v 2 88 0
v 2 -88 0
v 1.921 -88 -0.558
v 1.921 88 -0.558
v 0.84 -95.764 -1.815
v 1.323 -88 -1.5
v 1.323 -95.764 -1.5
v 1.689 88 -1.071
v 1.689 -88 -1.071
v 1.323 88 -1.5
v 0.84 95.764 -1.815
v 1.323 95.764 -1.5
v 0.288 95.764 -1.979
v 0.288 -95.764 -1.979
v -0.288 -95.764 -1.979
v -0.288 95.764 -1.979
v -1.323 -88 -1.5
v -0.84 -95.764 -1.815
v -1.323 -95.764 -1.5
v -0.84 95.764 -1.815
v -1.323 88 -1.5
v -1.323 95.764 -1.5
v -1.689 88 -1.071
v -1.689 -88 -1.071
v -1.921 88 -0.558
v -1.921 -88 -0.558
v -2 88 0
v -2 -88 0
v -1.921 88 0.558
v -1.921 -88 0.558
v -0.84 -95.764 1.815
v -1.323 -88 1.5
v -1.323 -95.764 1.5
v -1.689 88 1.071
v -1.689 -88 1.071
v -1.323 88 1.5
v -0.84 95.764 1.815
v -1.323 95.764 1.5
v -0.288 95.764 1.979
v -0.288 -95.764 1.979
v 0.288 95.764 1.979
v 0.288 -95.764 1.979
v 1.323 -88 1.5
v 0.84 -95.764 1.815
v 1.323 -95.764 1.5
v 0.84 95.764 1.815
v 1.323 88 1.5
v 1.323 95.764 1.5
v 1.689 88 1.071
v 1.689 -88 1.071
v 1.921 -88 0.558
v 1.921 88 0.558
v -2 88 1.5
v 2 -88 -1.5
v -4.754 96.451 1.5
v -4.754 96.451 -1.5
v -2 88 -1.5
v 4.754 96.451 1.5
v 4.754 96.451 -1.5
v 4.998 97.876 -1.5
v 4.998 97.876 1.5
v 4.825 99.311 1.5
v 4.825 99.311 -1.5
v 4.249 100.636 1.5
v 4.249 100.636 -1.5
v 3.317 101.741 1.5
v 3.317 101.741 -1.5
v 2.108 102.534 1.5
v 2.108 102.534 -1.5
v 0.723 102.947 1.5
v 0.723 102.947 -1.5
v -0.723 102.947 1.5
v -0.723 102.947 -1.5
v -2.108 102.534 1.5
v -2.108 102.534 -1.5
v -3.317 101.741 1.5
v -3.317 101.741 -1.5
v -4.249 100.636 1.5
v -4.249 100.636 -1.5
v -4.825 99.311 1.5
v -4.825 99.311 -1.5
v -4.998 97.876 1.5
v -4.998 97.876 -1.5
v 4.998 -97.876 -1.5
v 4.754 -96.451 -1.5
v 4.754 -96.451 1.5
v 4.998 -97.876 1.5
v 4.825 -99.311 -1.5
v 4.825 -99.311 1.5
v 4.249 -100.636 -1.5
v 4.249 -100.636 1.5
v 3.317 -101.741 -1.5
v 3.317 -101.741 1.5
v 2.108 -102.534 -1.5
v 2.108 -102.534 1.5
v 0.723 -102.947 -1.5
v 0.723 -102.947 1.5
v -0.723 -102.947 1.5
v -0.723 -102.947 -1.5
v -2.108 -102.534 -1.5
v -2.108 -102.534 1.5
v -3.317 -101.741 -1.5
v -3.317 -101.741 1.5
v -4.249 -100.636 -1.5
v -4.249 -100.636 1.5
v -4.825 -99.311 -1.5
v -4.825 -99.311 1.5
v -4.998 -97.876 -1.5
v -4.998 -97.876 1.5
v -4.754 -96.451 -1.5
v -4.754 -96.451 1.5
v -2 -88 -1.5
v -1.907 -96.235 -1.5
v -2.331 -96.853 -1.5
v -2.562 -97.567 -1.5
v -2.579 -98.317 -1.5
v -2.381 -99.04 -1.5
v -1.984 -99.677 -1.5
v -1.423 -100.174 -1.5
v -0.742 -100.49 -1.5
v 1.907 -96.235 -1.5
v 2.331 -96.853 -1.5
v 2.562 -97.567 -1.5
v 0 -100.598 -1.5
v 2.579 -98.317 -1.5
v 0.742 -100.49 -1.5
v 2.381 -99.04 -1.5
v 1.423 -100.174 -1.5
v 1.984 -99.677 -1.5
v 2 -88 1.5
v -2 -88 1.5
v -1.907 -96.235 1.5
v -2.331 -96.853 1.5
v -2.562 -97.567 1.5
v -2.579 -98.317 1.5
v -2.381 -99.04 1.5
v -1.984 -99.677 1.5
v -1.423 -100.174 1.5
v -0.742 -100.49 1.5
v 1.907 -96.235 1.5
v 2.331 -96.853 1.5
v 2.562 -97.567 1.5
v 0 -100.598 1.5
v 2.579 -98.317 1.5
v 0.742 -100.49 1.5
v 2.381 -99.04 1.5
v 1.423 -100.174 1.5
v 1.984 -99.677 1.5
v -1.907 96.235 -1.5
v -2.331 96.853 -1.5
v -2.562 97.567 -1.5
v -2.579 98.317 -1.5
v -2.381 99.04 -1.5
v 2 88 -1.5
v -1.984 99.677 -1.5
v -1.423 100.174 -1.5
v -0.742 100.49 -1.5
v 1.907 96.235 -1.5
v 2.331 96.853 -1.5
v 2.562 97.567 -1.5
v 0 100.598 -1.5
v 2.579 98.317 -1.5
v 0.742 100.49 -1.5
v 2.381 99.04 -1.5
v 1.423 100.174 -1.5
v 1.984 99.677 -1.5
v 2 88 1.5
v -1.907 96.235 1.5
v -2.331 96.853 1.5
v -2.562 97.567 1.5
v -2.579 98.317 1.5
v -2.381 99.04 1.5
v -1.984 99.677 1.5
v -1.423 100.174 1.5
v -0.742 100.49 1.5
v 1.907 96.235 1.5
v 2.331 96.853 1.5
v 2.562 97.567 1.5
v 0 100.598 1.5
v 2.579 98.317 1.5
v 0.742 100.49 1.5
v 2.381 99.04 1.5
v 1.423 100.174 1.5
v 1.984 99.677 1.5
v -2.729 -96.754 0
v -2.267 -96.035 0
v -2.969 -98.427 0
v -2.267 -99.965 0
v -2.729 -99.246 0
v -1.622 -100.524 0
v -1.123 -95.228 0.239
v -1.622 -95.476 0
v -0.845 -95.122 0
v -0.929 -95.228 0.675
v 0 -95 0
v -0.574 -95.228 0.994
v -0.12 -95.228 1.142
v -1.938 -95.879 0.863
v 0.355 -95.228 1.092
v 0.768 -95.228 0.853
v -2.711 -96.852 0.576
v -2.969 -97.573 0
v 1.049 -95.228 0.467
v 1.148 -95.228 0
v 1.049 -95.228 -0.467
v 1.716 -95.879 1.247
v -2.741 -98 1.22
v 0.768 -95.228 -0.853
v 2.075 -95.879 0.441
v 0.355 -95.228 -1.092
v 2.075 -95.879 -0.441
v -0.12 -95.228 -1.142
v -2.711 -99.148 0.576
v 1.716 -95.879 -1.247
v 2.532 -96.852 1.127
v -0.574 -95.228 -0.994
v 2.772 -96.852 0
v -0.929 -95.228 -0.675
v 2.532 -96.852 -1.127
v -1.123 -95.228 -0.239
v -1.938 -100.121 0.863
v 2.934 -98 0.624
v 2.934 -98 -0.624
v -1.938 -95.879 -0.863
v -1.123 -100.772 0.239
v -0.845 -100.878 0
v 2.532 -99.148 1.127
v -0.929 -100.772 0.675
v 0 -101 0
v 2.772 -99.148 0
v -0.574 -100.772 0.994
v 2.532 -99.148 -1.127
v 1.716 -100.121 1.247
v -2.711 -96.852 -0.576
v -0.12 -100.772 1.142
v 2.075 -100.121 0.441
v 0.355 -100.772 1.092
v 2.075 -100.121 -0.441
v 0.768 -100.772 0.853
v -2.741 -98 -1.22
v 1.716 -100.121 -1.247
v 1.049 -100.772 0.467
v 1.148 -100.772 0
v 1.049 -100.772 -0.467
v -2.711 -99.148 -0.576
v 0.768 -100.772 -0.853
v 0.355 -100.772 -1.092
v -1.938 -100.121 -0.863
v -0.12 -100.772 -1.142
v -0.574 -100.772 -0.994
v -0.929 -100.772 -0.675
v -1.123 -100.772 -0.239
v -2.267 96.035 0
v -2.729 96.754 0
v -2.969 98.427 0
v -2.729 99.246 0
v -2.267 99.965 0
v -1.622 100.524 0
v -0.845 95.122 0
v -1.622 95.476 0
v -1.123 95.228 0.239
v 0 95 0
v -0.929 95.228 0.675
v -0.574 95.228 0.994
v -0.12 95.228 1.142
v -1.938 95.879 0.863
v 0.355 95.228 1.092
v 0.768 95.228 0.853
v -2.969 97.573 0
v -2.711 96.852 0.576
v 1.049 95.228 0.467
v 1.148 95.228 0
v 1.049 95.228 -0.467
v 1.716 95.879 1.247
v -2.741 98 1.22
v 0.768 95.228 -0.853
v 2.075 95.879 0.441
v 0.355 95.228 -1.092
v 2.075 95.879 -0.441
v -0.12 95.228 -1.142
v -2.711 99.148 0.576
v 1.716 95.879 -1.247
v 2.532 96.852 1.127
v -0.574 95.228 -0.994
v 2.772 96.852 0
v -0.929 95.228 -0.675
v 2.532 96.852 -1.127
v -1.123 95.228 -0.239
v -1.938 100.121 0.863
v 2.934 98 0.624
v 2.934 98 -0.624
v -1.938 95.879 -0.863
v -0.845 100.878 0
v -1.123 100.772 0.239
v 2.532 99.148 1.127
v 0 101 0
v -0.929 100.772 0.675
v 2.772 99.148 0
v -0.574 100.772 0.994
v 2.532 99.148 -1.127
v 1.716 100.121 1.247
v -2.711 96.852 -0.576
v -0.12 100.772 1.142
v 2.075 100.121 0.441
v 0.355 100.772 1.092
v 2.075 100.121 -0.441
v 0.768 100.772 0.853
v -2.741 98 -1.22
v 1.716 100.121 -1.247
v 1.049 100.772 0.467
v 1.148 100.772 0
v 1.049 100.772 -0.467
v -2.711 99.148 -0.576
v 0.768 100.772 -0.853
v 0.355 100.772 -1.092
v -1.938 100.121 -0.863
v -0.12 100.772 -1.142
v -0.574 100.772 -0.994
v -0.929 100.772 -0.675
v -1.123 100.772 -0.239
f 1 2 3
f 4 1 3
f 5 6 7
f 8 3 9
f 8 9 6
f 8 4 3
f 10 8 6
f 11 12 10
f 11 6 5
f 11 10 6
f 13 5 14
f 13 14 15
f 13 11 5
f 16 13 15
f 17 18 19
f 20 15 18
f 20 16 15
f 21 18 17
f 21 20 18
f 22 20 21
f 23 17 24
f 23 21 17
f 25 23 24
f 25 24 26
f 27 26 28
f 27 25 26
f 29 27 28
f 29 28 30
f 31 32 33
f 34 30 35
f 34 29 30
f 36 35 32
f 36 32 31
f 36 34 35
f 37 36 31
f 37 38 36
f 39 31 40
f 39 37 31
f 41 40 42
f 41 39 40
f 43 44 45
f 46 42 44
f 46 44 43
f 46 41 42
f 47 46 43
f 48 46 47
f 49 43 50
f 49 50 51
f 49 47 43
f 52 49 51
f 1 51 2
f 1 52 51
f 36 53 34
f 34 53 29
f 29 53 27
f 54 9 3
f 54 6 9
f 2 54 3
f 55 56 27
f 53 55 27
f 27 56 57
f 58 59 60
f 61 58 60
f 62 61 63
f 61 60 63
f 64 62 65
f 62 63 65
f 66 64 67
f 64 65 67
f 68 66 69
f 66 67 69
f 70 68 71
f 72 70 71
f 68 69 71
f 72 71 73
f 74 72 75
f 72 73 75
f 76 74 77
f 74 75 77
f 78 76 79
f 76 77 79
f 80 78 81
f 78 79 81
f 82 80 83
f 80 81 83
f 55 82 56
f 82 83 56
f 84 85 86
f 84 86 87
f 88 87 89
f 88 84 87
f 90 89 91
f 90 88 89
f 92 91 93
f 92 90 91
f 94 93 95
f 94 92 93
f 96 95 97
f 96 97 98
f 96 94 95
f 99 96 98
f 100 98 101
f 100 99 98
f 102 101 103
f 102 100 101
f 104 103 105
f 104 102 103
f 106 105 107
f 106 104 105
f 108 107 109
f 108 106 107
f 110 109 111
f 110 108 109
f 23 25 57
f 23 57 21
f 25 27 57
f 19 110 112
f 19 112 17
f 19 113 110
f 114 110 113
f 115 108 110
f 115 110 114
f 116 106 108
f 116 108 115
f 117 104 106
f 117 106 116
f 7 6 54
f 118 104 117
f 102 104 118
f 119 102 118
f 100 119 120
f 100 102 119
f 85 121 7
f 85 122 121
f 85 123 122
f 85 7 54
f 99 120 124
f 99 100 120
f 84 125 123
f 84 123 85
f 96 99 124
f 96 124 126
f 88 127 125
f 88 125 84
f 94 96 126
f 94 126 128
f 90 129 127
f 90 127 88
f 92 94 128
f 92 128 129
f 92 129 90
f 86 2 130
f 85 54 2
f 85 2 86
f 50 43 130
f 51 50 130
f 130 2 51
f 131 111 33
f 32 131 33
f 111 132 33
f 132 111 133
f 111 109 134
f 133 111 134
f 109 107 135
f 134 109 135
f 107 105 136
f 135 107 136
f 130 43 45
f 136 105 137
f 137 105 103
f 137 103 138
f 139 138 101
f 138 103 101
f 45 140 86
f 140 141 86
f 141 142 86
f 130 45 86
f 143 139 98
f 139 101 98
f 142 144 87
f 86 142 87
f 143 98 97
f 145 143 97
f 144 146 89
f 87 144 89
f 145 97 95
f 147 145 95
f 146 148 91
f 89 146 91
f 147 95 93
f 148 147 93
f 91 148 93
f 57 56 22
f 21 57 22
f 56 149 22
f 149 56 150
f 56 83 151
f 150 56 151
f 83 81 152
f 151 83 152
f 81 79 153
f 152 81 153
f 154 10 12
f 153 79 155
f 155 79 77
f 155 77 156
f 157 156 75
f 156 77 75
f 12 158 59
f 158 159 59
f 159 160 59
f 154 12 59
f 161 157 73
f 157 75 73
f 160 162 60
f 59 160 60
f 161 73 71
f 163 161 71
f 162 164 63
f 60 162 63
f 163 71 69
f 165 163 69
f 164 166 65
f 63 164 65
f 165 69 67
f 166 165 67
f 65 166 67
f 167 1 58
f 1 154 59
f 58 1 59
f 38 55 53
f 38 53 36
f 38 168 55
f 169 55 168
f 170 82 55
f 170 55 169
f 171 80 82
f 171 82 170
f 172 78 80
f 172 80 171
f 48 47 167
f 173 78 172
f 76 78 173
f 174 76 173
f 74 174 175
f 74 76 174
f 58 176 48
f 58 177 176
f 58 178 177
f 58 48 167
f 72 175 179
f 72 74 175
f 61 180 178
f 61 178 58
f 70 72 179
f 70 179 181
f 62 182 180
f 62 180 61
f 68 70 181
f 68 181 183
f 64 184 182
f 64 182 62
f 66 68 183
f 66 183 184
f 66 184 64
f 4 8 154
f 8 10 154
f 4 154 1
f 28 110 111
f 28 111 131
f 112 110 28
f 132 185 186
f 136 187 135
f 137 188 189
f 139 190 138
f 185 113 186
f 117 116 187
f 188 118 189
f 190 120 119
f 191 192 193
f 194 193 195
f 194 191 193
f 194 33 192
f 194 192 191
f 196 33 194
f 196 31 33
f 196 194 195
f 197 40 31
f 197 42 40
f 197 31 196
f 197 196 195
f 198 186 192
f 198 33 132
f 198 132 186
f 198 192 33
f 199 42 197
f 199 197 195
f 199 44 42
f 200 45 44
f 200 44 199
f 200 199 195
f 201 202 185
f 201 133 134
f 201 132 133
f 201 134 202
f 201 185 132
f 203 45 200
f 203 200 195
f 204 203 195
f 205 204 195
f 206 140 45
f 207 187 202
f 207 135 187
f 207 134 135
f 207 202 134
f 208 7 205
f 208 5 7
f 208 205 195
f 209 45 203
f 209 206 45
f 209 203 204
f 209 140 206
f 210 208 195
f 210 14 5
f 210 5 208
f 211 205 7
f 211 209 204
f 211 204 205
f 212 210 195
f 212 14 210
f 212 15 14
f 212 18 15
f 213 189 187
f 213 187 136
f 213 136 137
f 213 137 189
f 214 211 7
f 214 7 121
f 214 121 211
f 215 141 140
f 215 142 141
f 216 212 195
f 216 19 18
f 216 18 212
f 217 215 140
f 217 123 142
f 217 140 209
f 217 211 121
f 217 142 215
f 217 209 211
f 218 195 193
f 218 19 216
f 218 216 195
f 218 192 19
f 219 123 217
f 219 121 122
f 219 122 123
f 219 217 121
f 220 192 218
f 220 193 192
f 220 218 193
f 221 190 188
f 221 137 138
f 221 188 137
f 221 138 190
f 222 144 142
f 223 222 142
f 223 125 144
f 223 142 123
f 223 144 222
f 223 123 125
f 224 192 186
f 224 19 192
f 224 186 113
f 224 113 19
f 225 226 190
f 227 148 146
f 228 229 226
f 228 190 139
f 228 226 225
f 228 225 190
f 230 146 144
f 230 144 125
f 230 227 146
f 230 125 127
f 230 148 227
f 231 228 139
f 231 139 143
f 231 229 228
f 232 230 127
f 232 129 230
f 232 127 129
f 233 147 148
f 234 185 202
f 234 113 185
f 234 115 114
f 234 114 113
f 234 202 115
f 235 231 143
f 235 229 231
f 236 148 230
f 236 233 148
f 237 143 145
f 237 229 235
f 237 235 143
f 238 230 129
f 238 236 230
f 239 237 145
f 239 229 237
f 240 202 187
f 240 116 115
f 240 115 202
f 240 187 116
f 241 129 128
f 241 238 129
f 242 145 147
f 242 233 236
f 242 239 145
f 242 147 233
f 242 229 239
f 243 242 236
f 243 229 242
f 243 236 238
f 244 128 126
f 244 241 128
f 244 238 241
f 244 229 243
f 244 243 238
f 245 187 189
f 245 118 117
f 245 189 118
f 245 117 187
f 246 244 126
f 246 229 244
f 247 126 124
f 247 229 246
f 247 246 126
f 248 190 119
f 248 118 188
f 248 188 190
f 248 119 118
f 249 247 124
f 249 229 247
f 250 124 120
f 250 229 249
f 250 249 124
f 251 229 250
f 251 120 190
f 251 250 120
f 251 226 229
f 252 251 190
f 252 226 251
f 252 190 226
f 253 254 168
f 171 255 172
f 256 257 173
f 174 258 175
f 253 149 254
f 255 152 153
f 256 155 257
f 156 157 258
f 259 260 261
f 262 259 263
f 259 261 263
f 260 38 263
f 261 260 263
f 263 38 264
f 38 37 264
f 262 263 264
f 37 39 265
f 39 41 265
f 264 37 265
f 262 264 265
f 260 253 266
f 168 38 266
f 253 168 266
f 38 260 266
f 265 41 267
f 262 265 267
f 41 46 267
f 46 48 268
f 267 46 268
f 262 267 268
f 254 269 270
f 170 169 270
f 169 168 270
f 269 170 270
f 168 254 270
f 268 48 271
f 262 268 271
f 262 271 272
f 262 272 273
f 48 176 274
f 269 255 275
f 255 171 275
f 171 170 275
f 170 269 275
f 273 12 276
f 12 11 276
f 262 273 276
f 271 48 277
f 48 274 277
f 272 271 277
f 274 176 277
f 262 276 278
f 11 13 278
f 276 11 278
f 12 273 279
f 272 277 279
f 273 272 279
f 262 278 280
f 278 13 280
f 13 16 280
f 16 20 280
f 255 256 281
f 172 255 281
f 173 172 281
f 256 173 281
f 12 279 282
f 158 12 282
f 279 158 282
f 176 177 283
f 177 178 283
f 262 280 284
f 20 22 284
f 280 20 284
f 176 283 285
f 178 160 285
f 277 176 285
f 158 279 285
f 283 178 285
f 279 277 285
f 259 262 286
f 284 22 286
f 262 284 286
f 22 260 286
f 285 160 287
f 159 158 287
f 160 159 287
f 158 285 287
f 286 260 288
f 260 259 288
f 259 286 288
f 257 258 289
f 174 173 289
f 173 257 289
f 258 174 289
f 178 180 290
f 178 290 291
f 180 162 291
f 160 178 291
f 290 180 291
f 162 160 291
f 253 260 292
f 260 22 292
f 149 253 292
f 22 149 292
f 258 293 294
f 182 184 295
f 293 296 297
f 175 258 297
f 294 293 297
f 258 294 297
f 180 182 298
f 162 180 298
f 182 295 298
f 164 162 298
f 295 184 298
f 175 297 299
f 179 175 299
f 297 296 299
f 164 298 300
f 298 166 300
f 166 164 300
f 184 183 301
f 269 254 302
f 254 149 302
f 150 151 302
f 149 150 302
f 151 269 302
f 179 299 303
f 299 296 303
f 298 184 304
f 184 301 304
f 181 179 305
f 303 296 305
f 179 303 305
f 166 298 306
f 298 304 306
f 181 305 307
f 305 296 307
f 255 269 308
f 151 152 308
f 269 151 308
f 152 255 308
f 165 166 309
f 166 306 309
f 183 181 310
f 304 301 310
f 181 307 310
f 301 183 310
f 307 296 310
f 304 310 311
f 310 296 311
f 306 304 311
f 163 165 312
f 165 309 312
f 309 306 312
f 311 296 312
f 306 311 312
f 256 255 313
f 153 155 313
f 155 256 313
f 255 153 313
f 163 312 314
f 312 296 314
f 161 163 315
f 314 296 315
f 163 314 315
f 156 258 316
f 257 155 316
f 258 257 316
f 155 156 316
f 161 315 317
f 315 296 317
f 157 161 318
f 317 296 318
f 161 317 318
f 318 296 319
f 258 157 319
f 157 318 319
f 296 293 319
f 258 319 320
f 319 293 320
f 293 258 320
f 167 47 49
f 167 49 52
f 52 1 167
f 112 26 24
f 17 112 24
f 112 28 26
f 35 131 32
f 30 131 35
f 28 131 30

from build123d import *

# Parameters (mm, degrees)
ESQUISSE1_W        = 2
ESQUISSE1_H        = 196
BOSS_EXTRU_1_DEPTH = 1.5


with BuildPart() as part:
    # Esquisse1 → Révolution1 (revolve)
    with BuildSketch(Plane.XY):
        with Locations((1, 0)):
            Rectangle(ESQUISSE1_W, ESQUISSE1_H)
    revolve(axis=Axis((0, -98, 0), (0, 1, 0)))

    # Esquisse2 → Boss.-Extru.1 (add, symmetric)
    with BuildSketch(Plane.XY):
        with BuildLine():
            Line((2, 88), (4.753939624, 96.450787925))
            ThreePointArc((4.753939624, 96.450787925), (0, 103), (-4.753939624, 96.450787925))
            Line((-4.753939624, 96.450787925), (-2, 88))
            Line((-2, 88), (2, 88))
        make_face()
    boss_extru_1 = extrude(amount=BOSS_EXTRU_1_DEPTH, both=True)

    # Esquisse3 → Enlèvement de matière-Révolution1 (revolve, cut)
    with BuildSketch(Plane.XY):
        with BuildLine():
            Line((0, 101), (0, 95))
            ThreePointArc((0, 95), (-3, 98), (0, 101))
        make_face()
    enl_vement_de_mati_re_r_volution1 = revolve(axis=Axis((0, 95, 0), (0, 1, 0)), mode=Mode.SUBTRACT)

    # Symétrie1: Boss.-Extru.1, Enlèvement de matière-Révolution1 across plane
    add(boss_extru_1.mirror(Plane.ZX))
    add(enl_vement_de_mati_re_r_volution1.mirror(Plane.ZX), mode=Mode.SUBTRACT)


solid = part.part
